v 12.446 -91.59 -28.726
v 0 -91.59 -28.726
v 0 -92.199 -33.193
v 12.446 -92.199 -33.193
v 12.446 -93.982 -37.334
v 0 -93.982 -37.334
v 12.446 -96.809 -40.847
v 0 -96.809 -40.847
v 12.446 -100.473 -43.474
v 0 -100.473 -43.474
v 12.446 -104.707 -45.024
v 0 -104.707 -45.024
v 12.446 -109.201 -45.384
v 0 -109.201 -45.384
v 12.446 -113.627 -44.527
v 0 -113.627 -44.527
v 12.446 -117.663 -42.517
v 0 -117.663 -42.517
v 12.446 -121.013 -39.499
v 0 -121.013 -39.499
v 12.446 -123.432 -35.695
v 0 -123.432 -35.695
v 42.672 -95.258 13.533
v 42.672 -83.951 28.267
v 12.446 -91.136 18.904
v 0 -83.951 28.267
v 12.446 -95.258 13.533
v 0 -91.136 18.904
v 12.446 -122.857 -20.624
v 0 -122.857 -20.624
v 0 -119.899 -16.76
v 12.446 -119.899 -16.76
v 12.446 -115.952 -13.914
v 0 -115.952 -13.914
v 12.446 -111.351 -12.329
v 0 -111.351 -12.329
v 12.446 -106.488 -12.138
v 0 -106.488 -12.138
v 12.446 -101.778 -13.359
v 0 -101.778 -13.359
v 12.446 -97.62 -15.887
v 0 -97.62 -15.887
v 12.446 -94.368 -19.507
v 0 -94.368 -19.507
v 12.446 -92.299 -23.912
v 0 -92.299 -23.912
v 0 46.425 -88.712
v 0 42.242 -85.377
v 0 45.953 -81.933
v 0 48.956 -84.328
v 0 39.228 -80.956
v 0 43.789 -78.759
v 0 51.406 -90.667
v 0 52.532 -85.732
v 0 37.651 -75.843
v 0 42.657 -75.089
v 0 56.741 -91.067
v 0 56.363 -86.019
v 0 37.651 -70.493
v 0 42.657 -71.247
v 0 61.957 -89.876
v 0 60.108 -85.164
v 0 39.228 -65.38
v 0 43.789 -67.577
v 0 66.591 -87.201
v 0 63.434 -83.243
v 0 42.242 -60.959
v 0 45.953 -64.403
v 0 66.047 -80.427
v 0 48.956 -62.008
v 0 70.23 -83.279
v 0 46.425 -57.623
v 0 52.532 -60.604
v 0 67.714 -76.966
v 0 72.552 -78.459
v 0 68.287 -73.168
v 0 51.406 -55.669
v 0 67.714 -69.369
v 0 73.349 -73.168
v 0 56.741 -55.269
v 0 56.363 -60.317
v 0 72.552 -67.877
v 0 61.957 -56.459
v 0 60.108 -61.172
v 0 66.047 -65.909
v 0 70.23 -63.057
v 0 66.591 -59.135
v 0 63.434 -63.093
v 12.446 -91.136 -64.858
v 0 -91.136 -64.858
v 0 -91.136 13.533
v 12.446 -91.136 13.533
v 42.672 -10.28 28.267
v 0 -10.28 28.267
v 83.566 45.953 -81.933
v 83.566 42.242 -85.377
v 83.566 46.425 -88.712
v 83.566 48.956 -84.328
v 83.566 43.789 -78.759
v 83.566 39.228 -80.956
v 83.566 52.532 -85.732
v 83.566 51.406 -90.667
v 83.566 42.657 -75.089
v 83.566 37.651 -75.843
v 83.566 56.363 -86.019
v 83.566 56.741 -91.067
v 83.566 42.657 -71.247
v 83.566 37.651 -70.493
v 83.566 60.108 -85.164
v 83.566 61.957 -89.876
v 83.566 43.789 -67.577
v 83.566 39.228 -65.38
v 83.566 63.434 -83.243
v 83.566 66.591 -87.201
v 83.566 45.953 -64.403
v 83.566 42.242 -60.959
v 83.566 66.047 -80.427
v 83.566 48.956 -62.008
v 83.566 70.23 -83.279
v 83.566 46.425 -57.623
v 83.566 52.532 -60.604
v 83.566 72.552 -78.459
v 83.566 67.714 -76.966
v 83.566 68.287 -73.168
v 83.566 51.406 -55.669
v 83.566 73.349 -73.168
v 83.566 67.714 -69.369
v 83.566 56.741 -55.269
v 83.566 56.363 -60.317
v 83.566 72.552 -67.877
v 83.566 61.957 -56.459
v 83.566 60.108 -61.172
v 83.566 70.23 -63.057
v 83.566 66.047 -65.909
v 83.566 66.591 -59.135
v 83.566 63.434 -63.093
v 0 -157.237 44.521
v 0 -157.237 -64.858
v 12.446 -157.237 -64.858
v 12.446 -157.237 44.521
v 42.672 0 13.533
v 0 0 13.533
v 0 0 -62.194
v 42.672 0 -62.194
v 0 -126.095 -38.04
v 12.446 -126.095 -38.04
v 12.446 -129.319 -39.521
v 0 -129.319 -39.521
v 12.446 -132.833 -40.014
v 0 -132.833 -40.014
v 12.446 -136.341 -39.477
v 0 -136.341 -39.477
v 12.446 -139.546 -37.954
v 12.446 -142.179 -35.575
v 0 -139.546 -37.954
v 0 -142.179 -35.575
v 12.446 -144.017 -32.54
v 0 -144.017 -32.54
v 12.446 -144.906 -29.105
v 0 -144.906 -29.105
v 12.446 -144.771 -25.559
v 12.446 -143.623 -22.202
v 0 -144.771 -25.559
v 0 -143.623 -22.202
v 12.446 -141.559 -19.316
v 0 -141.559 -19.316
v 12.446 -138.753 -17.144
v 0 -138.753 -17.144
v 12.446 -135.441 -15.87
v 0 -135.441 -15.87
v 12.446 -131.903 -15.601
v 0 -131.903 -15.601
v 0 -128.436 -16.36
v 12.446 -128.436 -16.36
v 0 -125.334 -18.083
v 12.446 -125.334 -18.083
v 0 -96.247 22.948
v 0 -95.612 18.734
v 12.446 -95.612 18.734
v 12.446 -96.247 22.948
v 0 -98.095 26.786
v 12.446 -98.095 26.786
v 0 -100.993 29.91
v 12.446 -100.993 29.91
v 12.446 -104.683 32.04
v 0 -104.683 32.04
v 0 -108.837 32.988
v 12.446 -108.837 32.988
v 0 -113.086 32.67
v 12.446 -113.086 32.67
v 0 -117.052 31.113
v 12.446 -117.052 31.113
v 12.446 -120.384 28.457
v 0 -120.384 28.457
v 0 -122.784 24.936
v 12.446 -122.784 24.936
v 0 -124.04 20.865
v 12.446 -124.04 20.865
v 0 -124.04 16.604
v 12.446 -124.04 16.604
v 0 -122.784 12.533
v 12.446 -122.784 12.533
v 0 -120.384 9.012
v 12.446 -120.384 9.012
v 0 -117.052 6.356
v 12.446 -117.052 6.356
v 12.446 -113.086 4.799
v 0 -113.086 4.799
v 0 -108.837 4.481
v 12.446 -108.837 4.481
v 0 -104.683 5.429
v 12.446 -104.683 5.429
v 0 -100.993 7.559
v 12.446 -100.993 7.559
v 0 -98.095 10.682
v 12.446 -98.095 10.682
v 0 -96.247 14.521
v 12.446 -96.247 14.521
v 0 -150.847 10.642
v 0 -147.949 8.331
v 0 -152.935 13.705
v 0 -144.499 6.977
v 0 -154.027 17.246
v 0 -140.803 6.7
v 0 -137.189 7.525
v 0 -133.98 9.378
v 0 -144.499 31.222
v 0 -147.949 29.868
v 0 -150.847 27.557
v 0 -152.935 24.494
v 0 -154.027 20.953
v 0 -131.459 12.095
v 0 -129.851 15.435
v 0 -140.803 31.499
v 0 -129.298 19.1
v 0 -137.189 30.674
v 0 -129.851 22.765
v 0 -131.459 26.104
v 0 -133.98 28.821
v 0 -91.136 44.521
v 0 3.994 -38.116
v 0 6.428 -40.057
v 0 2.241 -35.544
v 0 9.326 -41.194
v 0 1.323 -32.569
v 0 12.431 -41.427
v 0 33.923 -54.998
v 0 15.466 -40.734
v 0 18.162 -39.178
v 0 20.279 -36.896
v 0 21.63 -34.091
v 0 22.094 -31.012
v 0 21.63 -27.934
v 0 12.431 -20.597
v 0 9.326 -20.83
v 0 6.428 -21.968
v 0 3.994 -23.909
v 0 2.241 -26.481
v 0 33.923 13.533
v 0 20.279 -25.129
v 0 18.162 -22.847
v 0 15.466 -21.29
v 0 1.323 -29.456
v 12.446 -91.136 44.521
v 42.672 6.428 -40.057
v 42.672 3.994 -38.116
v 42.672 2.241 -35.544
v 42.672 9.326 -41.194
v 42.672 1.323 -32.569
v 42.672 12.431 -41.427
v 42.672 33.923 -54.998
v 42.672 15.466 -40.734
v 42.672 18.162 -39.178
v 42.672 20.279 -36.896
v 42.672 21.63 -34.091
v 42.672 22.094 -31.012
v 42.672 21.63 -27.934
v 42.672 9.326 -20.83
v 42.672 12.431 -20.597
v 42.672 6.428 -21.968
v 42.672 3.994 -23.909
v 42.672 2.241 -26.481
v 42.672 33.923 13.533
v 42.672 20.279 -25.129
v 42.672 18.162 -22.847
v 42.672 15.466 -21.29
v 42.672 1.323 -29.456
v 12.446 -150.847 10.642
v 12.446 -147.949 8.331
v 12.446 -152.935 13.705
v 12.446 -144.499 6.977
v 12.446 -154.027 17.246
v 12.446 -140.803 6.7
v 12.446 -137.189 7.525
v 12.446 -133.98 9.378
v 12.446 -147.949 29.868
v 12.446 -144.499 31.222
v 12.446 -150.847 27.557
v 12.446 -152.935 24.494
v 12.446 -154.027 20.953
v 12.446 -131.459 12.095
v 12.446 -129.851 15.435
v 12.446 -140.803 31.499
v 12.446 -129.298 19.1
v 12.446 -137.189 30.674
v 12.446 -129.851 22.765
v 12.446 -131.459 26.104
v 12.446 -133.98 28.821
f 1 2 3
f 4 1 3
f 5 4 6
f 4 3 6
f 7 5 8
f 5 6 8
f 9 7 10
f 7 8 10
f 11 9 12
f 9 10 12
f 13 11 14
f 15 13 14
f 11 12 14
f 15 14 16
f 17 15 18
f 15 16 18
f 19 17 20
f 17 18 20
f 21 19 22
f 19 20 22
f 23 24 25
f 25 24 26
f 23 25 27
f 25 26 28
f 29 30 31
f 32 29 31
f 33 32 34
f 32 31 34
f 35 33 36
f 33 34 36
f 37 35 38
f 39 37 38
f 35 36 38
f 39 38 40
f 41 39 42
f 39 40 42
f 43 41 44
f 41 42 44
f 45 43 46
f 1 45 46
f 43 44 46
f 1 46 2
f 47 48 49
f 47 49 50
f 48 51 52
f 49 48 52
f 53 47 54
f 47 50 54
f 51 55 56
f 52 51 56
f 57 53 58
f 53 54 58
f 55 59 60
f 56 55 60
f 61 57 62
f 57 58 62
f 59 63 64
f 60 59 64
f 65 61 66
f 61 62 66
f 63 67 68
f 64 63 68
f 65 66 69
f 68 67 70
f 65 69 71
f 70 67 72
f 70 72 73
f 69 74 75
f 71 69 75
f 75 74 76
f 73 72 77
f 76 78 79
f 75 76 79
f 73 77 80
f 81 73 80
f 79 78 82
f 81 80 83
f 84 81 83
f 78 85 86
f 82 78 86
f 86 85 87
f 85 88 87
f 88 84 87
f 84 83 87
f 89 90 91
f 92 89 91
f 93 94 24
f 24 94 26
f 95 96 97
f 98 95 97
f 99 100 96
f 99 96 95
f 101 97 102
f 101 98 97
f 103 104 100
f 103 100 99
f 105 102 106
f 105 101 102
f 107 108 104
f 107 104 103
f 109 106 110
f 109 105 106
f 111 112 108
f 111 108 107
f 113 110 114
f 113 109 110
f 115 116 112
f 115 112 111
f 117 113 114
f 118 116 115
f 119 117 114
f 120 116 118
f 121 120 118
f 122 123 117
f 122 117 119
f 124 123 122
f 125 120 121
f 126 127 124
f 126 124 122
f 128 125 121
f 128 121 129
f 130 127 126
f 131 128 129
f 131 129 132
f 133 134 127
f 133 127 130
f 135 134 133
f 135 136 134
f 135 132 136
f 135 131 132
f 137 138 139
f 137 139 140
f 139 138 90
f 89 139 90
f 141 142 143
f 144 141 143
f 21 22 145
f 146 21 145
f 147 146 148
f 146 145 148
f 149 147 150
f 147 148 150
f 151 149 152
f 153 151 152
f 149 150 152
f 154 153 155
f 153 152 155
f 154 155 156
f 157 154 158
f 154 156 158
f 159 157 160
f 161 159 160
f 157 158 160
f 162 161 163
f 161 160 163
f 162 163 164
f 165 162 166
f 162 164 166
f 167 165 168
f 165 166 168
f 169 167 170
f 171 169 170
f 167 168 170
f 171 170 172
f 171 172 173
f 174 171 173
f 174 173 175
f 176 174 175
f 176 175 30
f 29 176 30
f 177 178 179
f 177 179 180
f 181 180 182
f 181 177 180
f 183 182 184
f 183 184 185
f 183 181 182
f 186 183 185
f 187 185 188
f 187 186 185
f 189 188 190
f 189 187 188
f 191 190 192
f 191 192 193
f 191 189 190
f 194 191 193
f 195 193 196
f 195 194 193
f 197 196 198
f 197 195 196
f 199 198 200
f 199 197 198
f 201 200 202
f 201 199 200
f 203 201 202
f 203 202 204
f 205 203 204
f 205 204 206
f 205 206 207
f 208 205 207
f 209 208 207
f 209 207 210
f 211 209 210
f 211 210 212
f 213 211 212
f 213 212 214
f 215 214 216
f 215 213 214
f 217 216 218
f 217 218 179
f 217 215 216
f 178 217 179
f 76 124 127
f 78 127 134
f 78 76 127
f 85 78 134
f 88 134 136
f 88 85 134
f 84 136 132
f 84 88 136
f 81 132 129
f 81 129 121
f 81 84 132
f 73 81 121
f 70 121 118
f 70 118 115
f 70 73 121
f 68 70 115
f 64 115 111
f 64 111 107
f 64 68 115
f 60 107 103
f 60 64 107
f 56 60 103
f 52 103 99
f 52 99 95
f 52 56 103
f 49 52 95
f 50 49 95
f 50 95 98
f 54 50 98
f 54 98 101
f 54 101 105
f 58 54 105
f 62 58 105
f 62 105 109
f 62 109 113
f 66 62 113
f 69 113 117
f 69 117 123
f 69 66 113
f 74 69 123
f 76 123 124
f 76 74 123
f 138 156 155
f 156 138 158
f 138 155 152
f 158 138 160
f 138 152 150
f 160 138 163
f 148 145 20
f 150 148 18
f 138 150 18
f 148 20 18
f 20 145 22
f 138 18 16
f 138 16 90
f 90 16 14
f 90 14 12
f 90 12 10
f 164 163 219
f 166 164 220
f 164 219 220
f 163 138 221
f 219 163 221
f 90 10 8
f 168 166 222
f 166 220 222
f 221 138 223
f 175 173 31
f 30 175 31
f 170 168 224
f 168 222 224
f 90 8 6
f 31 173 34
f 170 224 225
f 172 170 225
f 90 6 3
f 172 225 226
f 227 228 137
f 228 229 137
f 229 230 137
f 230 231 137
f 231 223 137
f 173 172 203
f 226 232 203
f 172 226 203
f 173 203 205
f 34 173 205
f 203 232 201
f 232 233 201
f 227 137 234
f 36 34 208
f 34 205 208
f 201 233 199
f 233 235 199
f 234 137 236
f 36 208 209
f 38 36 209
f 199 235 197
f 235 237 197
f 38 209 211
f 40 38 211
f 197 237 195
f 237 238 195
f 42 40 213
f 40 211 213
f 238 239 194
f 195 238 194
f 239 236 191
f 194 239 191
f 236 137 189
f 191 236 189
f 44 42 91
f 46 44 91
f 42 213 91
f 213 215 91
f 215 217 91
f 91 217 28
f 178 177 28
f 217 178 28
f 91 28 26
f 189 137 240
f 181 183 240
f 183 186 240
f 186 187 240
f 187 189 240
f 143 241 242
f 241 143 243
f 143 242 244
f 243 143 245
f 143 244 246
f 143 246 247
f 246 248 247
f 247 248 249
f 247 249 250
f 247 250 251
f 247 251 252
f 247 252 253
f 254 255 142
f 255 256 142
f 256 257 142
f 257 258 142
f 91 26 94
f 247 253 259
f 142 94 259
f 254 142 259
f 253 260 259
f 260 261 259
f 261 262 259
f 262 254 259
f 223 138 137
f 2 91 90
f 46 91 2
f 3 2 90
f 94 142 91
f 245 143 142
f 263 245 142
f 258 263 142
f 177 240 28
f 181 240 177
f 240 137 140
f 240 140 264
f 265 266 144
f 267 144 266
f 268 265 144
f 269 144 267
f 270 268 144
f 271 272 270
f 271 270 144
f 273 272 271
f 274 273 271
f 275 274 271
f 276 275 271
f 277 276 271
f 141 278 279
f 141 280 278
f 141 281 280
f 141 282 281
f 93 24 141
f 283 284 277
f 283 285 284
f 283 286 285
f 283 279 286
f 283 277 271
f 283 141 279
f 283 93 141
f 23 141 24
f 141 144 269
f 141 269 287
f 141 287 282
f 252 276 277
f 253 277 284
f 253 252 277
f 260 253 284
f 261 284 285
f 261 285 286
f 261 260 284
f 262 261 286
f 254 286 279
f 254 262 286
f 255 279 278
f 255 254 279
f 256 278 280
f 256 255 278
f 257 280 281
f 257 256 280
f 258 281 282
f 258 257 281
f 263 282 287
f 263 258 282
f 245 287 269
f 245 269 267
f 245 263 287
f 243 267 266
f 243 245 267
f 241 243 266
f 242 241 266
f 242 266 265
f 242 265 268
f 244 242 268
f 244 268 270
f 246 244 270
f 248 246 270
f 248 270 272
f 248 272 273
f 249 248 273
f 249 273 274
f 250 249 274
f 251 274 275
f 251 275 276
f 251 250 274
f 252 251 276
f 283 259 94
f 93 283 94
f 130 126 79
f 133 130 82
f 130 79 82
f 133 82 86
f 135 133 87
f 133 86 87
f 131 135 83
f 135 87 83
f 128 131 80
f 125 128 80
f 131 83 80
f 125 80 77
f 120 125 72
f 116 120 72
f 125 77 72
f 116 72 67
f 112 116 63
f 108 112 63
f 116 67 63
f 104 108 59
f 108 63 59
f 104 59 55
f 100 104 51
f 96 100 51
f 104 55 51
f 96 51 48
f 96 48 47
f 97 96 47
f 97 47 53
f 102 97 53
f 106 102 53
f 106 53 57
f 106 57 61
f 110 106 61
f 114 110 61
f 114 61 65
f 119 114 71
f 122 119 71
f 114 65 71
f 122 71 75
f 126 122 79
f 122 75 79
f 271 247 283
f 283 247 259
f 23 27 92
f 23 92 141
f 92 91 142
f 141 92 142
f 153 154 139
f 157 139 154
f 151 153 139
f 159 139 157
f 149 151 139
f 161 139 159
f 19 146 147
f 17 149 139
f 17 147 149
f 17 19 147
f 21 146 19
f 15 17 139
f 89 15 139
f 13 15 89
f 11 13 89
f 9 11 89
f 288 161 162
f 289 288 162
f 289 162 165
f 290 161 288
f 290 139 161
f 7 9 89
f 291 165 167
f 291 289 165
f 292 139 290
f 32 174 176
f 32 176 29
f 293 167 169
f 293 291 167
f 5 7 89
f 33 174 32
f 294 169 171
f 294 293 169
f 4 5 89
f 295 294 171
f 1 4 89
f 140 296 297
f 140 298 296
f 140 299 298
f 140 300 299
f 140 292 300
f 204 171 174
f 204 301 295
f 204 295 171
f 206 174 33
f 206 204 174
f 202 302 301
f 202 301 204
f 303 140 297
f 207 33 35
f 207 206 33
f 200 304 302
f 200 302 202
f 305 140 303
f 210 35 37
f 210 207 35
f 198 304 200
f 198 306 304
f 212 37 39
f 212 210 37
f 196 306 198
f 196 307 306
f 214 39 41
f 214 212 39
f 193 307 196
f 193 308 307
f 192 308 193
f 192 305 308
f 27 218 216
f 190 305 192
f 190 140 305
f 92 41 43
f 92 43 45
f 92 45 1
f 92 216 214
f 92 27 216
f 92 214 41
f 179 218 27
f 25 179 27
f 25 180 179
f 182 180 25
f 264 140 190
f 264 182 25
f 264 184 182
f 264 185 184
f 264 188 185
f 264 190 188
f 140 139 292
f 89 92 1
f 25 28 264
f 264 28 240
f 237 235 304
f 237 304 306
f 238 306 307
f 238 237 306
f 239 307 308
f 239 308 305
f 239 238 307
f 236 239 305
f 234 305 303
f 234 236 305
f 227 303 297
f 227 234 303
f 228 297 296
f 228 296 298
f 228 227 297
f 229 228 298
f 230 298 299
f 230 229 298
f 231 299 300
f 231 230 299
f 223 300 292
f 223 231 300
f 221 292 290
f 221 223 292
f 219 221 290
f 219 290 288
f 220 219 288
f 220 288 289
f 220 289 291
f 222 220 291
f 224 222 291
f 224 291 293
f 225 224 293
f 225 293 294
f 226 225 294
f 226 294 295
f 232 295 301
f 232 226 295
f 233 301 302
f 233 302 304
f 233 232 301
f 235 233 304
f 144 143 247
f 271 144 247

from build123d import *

# Parameters (mm, degrees)
F0_R     = 10.443962
F1_DEPTH = 42.672
F2_W     = 66.101492
F2_H     = 109.3782
F2_R     = 12.433951
F2_R_2   = 14.293773
F3_DEPTH = 12.446
F4_R     = 17.949328
F4_R_2   = 12.886823
F5_DEPTH = 83.566


with BuildPart() as f1:
    # F0 (on Right) → F1 (new body)
    with BuildSketch(Plane.YZ):
        Polygon((0, -62.193878), (33.922866, -54.998115), (33.922866, 13.532934), (-10.279658, 28.267112), (-83.950534, 28.267112), (-95.258161, 13.532934), (-40.433321, 13.532934), (0, 13.532934), (0, -10.795589), align=None)
        with Locations((11.650279, -31.012248)):
            Circle(F0_R, mode=Mode.SUBTRACT)
    extrude(amount=F1_DEPTH)

    # F2 (on Right) → F3 (join)
    with BuildSketch(Plane.YZ):
        with Locations((-124.186635, -10.168495)):
            Rectangle(F2_W, F2_H)
        with BuildLine():
            ThreePointArc((-123.431967, -35.69477), (-144.967962, -27.327392), (-122.857463, -20.623816))
            ThreePointArc((-122.857463, -20.623816), (-104.088314, -12.575896), (-91.589596, -28.72619))
            ThreePointArc((-91.589596, -28.72619), (-104.706553, -45.024179), (-123.431967, -35.69477))
        make_face(mode=Mode.SUBTRACT)
        with Locations((-141.732097, 19.099573)):
            Circle(F2_R, mode=Mode.SUBTRACT)
        with Locations((-109.905452, 18.734435)):
            Circle(F2_R_2, mode=Mode.SUBTRACT)
    extrude(amount=F3_DEPTH)


with BuildPart() as f5:
    # F4 (on Right) → F5 (new body)
    with BuildSketch(Plane.YZ):
        with Locations((55.399694, -73.167913)):
            Circle(F4_R)
        with Locations((55.399694, -73.167913)):
            Circle(F4_R_2, mode=Mode.SUBTRACT)
    extrude(amount=F5_DEPTH)


solid = Compound([f1.part, f5.part])
